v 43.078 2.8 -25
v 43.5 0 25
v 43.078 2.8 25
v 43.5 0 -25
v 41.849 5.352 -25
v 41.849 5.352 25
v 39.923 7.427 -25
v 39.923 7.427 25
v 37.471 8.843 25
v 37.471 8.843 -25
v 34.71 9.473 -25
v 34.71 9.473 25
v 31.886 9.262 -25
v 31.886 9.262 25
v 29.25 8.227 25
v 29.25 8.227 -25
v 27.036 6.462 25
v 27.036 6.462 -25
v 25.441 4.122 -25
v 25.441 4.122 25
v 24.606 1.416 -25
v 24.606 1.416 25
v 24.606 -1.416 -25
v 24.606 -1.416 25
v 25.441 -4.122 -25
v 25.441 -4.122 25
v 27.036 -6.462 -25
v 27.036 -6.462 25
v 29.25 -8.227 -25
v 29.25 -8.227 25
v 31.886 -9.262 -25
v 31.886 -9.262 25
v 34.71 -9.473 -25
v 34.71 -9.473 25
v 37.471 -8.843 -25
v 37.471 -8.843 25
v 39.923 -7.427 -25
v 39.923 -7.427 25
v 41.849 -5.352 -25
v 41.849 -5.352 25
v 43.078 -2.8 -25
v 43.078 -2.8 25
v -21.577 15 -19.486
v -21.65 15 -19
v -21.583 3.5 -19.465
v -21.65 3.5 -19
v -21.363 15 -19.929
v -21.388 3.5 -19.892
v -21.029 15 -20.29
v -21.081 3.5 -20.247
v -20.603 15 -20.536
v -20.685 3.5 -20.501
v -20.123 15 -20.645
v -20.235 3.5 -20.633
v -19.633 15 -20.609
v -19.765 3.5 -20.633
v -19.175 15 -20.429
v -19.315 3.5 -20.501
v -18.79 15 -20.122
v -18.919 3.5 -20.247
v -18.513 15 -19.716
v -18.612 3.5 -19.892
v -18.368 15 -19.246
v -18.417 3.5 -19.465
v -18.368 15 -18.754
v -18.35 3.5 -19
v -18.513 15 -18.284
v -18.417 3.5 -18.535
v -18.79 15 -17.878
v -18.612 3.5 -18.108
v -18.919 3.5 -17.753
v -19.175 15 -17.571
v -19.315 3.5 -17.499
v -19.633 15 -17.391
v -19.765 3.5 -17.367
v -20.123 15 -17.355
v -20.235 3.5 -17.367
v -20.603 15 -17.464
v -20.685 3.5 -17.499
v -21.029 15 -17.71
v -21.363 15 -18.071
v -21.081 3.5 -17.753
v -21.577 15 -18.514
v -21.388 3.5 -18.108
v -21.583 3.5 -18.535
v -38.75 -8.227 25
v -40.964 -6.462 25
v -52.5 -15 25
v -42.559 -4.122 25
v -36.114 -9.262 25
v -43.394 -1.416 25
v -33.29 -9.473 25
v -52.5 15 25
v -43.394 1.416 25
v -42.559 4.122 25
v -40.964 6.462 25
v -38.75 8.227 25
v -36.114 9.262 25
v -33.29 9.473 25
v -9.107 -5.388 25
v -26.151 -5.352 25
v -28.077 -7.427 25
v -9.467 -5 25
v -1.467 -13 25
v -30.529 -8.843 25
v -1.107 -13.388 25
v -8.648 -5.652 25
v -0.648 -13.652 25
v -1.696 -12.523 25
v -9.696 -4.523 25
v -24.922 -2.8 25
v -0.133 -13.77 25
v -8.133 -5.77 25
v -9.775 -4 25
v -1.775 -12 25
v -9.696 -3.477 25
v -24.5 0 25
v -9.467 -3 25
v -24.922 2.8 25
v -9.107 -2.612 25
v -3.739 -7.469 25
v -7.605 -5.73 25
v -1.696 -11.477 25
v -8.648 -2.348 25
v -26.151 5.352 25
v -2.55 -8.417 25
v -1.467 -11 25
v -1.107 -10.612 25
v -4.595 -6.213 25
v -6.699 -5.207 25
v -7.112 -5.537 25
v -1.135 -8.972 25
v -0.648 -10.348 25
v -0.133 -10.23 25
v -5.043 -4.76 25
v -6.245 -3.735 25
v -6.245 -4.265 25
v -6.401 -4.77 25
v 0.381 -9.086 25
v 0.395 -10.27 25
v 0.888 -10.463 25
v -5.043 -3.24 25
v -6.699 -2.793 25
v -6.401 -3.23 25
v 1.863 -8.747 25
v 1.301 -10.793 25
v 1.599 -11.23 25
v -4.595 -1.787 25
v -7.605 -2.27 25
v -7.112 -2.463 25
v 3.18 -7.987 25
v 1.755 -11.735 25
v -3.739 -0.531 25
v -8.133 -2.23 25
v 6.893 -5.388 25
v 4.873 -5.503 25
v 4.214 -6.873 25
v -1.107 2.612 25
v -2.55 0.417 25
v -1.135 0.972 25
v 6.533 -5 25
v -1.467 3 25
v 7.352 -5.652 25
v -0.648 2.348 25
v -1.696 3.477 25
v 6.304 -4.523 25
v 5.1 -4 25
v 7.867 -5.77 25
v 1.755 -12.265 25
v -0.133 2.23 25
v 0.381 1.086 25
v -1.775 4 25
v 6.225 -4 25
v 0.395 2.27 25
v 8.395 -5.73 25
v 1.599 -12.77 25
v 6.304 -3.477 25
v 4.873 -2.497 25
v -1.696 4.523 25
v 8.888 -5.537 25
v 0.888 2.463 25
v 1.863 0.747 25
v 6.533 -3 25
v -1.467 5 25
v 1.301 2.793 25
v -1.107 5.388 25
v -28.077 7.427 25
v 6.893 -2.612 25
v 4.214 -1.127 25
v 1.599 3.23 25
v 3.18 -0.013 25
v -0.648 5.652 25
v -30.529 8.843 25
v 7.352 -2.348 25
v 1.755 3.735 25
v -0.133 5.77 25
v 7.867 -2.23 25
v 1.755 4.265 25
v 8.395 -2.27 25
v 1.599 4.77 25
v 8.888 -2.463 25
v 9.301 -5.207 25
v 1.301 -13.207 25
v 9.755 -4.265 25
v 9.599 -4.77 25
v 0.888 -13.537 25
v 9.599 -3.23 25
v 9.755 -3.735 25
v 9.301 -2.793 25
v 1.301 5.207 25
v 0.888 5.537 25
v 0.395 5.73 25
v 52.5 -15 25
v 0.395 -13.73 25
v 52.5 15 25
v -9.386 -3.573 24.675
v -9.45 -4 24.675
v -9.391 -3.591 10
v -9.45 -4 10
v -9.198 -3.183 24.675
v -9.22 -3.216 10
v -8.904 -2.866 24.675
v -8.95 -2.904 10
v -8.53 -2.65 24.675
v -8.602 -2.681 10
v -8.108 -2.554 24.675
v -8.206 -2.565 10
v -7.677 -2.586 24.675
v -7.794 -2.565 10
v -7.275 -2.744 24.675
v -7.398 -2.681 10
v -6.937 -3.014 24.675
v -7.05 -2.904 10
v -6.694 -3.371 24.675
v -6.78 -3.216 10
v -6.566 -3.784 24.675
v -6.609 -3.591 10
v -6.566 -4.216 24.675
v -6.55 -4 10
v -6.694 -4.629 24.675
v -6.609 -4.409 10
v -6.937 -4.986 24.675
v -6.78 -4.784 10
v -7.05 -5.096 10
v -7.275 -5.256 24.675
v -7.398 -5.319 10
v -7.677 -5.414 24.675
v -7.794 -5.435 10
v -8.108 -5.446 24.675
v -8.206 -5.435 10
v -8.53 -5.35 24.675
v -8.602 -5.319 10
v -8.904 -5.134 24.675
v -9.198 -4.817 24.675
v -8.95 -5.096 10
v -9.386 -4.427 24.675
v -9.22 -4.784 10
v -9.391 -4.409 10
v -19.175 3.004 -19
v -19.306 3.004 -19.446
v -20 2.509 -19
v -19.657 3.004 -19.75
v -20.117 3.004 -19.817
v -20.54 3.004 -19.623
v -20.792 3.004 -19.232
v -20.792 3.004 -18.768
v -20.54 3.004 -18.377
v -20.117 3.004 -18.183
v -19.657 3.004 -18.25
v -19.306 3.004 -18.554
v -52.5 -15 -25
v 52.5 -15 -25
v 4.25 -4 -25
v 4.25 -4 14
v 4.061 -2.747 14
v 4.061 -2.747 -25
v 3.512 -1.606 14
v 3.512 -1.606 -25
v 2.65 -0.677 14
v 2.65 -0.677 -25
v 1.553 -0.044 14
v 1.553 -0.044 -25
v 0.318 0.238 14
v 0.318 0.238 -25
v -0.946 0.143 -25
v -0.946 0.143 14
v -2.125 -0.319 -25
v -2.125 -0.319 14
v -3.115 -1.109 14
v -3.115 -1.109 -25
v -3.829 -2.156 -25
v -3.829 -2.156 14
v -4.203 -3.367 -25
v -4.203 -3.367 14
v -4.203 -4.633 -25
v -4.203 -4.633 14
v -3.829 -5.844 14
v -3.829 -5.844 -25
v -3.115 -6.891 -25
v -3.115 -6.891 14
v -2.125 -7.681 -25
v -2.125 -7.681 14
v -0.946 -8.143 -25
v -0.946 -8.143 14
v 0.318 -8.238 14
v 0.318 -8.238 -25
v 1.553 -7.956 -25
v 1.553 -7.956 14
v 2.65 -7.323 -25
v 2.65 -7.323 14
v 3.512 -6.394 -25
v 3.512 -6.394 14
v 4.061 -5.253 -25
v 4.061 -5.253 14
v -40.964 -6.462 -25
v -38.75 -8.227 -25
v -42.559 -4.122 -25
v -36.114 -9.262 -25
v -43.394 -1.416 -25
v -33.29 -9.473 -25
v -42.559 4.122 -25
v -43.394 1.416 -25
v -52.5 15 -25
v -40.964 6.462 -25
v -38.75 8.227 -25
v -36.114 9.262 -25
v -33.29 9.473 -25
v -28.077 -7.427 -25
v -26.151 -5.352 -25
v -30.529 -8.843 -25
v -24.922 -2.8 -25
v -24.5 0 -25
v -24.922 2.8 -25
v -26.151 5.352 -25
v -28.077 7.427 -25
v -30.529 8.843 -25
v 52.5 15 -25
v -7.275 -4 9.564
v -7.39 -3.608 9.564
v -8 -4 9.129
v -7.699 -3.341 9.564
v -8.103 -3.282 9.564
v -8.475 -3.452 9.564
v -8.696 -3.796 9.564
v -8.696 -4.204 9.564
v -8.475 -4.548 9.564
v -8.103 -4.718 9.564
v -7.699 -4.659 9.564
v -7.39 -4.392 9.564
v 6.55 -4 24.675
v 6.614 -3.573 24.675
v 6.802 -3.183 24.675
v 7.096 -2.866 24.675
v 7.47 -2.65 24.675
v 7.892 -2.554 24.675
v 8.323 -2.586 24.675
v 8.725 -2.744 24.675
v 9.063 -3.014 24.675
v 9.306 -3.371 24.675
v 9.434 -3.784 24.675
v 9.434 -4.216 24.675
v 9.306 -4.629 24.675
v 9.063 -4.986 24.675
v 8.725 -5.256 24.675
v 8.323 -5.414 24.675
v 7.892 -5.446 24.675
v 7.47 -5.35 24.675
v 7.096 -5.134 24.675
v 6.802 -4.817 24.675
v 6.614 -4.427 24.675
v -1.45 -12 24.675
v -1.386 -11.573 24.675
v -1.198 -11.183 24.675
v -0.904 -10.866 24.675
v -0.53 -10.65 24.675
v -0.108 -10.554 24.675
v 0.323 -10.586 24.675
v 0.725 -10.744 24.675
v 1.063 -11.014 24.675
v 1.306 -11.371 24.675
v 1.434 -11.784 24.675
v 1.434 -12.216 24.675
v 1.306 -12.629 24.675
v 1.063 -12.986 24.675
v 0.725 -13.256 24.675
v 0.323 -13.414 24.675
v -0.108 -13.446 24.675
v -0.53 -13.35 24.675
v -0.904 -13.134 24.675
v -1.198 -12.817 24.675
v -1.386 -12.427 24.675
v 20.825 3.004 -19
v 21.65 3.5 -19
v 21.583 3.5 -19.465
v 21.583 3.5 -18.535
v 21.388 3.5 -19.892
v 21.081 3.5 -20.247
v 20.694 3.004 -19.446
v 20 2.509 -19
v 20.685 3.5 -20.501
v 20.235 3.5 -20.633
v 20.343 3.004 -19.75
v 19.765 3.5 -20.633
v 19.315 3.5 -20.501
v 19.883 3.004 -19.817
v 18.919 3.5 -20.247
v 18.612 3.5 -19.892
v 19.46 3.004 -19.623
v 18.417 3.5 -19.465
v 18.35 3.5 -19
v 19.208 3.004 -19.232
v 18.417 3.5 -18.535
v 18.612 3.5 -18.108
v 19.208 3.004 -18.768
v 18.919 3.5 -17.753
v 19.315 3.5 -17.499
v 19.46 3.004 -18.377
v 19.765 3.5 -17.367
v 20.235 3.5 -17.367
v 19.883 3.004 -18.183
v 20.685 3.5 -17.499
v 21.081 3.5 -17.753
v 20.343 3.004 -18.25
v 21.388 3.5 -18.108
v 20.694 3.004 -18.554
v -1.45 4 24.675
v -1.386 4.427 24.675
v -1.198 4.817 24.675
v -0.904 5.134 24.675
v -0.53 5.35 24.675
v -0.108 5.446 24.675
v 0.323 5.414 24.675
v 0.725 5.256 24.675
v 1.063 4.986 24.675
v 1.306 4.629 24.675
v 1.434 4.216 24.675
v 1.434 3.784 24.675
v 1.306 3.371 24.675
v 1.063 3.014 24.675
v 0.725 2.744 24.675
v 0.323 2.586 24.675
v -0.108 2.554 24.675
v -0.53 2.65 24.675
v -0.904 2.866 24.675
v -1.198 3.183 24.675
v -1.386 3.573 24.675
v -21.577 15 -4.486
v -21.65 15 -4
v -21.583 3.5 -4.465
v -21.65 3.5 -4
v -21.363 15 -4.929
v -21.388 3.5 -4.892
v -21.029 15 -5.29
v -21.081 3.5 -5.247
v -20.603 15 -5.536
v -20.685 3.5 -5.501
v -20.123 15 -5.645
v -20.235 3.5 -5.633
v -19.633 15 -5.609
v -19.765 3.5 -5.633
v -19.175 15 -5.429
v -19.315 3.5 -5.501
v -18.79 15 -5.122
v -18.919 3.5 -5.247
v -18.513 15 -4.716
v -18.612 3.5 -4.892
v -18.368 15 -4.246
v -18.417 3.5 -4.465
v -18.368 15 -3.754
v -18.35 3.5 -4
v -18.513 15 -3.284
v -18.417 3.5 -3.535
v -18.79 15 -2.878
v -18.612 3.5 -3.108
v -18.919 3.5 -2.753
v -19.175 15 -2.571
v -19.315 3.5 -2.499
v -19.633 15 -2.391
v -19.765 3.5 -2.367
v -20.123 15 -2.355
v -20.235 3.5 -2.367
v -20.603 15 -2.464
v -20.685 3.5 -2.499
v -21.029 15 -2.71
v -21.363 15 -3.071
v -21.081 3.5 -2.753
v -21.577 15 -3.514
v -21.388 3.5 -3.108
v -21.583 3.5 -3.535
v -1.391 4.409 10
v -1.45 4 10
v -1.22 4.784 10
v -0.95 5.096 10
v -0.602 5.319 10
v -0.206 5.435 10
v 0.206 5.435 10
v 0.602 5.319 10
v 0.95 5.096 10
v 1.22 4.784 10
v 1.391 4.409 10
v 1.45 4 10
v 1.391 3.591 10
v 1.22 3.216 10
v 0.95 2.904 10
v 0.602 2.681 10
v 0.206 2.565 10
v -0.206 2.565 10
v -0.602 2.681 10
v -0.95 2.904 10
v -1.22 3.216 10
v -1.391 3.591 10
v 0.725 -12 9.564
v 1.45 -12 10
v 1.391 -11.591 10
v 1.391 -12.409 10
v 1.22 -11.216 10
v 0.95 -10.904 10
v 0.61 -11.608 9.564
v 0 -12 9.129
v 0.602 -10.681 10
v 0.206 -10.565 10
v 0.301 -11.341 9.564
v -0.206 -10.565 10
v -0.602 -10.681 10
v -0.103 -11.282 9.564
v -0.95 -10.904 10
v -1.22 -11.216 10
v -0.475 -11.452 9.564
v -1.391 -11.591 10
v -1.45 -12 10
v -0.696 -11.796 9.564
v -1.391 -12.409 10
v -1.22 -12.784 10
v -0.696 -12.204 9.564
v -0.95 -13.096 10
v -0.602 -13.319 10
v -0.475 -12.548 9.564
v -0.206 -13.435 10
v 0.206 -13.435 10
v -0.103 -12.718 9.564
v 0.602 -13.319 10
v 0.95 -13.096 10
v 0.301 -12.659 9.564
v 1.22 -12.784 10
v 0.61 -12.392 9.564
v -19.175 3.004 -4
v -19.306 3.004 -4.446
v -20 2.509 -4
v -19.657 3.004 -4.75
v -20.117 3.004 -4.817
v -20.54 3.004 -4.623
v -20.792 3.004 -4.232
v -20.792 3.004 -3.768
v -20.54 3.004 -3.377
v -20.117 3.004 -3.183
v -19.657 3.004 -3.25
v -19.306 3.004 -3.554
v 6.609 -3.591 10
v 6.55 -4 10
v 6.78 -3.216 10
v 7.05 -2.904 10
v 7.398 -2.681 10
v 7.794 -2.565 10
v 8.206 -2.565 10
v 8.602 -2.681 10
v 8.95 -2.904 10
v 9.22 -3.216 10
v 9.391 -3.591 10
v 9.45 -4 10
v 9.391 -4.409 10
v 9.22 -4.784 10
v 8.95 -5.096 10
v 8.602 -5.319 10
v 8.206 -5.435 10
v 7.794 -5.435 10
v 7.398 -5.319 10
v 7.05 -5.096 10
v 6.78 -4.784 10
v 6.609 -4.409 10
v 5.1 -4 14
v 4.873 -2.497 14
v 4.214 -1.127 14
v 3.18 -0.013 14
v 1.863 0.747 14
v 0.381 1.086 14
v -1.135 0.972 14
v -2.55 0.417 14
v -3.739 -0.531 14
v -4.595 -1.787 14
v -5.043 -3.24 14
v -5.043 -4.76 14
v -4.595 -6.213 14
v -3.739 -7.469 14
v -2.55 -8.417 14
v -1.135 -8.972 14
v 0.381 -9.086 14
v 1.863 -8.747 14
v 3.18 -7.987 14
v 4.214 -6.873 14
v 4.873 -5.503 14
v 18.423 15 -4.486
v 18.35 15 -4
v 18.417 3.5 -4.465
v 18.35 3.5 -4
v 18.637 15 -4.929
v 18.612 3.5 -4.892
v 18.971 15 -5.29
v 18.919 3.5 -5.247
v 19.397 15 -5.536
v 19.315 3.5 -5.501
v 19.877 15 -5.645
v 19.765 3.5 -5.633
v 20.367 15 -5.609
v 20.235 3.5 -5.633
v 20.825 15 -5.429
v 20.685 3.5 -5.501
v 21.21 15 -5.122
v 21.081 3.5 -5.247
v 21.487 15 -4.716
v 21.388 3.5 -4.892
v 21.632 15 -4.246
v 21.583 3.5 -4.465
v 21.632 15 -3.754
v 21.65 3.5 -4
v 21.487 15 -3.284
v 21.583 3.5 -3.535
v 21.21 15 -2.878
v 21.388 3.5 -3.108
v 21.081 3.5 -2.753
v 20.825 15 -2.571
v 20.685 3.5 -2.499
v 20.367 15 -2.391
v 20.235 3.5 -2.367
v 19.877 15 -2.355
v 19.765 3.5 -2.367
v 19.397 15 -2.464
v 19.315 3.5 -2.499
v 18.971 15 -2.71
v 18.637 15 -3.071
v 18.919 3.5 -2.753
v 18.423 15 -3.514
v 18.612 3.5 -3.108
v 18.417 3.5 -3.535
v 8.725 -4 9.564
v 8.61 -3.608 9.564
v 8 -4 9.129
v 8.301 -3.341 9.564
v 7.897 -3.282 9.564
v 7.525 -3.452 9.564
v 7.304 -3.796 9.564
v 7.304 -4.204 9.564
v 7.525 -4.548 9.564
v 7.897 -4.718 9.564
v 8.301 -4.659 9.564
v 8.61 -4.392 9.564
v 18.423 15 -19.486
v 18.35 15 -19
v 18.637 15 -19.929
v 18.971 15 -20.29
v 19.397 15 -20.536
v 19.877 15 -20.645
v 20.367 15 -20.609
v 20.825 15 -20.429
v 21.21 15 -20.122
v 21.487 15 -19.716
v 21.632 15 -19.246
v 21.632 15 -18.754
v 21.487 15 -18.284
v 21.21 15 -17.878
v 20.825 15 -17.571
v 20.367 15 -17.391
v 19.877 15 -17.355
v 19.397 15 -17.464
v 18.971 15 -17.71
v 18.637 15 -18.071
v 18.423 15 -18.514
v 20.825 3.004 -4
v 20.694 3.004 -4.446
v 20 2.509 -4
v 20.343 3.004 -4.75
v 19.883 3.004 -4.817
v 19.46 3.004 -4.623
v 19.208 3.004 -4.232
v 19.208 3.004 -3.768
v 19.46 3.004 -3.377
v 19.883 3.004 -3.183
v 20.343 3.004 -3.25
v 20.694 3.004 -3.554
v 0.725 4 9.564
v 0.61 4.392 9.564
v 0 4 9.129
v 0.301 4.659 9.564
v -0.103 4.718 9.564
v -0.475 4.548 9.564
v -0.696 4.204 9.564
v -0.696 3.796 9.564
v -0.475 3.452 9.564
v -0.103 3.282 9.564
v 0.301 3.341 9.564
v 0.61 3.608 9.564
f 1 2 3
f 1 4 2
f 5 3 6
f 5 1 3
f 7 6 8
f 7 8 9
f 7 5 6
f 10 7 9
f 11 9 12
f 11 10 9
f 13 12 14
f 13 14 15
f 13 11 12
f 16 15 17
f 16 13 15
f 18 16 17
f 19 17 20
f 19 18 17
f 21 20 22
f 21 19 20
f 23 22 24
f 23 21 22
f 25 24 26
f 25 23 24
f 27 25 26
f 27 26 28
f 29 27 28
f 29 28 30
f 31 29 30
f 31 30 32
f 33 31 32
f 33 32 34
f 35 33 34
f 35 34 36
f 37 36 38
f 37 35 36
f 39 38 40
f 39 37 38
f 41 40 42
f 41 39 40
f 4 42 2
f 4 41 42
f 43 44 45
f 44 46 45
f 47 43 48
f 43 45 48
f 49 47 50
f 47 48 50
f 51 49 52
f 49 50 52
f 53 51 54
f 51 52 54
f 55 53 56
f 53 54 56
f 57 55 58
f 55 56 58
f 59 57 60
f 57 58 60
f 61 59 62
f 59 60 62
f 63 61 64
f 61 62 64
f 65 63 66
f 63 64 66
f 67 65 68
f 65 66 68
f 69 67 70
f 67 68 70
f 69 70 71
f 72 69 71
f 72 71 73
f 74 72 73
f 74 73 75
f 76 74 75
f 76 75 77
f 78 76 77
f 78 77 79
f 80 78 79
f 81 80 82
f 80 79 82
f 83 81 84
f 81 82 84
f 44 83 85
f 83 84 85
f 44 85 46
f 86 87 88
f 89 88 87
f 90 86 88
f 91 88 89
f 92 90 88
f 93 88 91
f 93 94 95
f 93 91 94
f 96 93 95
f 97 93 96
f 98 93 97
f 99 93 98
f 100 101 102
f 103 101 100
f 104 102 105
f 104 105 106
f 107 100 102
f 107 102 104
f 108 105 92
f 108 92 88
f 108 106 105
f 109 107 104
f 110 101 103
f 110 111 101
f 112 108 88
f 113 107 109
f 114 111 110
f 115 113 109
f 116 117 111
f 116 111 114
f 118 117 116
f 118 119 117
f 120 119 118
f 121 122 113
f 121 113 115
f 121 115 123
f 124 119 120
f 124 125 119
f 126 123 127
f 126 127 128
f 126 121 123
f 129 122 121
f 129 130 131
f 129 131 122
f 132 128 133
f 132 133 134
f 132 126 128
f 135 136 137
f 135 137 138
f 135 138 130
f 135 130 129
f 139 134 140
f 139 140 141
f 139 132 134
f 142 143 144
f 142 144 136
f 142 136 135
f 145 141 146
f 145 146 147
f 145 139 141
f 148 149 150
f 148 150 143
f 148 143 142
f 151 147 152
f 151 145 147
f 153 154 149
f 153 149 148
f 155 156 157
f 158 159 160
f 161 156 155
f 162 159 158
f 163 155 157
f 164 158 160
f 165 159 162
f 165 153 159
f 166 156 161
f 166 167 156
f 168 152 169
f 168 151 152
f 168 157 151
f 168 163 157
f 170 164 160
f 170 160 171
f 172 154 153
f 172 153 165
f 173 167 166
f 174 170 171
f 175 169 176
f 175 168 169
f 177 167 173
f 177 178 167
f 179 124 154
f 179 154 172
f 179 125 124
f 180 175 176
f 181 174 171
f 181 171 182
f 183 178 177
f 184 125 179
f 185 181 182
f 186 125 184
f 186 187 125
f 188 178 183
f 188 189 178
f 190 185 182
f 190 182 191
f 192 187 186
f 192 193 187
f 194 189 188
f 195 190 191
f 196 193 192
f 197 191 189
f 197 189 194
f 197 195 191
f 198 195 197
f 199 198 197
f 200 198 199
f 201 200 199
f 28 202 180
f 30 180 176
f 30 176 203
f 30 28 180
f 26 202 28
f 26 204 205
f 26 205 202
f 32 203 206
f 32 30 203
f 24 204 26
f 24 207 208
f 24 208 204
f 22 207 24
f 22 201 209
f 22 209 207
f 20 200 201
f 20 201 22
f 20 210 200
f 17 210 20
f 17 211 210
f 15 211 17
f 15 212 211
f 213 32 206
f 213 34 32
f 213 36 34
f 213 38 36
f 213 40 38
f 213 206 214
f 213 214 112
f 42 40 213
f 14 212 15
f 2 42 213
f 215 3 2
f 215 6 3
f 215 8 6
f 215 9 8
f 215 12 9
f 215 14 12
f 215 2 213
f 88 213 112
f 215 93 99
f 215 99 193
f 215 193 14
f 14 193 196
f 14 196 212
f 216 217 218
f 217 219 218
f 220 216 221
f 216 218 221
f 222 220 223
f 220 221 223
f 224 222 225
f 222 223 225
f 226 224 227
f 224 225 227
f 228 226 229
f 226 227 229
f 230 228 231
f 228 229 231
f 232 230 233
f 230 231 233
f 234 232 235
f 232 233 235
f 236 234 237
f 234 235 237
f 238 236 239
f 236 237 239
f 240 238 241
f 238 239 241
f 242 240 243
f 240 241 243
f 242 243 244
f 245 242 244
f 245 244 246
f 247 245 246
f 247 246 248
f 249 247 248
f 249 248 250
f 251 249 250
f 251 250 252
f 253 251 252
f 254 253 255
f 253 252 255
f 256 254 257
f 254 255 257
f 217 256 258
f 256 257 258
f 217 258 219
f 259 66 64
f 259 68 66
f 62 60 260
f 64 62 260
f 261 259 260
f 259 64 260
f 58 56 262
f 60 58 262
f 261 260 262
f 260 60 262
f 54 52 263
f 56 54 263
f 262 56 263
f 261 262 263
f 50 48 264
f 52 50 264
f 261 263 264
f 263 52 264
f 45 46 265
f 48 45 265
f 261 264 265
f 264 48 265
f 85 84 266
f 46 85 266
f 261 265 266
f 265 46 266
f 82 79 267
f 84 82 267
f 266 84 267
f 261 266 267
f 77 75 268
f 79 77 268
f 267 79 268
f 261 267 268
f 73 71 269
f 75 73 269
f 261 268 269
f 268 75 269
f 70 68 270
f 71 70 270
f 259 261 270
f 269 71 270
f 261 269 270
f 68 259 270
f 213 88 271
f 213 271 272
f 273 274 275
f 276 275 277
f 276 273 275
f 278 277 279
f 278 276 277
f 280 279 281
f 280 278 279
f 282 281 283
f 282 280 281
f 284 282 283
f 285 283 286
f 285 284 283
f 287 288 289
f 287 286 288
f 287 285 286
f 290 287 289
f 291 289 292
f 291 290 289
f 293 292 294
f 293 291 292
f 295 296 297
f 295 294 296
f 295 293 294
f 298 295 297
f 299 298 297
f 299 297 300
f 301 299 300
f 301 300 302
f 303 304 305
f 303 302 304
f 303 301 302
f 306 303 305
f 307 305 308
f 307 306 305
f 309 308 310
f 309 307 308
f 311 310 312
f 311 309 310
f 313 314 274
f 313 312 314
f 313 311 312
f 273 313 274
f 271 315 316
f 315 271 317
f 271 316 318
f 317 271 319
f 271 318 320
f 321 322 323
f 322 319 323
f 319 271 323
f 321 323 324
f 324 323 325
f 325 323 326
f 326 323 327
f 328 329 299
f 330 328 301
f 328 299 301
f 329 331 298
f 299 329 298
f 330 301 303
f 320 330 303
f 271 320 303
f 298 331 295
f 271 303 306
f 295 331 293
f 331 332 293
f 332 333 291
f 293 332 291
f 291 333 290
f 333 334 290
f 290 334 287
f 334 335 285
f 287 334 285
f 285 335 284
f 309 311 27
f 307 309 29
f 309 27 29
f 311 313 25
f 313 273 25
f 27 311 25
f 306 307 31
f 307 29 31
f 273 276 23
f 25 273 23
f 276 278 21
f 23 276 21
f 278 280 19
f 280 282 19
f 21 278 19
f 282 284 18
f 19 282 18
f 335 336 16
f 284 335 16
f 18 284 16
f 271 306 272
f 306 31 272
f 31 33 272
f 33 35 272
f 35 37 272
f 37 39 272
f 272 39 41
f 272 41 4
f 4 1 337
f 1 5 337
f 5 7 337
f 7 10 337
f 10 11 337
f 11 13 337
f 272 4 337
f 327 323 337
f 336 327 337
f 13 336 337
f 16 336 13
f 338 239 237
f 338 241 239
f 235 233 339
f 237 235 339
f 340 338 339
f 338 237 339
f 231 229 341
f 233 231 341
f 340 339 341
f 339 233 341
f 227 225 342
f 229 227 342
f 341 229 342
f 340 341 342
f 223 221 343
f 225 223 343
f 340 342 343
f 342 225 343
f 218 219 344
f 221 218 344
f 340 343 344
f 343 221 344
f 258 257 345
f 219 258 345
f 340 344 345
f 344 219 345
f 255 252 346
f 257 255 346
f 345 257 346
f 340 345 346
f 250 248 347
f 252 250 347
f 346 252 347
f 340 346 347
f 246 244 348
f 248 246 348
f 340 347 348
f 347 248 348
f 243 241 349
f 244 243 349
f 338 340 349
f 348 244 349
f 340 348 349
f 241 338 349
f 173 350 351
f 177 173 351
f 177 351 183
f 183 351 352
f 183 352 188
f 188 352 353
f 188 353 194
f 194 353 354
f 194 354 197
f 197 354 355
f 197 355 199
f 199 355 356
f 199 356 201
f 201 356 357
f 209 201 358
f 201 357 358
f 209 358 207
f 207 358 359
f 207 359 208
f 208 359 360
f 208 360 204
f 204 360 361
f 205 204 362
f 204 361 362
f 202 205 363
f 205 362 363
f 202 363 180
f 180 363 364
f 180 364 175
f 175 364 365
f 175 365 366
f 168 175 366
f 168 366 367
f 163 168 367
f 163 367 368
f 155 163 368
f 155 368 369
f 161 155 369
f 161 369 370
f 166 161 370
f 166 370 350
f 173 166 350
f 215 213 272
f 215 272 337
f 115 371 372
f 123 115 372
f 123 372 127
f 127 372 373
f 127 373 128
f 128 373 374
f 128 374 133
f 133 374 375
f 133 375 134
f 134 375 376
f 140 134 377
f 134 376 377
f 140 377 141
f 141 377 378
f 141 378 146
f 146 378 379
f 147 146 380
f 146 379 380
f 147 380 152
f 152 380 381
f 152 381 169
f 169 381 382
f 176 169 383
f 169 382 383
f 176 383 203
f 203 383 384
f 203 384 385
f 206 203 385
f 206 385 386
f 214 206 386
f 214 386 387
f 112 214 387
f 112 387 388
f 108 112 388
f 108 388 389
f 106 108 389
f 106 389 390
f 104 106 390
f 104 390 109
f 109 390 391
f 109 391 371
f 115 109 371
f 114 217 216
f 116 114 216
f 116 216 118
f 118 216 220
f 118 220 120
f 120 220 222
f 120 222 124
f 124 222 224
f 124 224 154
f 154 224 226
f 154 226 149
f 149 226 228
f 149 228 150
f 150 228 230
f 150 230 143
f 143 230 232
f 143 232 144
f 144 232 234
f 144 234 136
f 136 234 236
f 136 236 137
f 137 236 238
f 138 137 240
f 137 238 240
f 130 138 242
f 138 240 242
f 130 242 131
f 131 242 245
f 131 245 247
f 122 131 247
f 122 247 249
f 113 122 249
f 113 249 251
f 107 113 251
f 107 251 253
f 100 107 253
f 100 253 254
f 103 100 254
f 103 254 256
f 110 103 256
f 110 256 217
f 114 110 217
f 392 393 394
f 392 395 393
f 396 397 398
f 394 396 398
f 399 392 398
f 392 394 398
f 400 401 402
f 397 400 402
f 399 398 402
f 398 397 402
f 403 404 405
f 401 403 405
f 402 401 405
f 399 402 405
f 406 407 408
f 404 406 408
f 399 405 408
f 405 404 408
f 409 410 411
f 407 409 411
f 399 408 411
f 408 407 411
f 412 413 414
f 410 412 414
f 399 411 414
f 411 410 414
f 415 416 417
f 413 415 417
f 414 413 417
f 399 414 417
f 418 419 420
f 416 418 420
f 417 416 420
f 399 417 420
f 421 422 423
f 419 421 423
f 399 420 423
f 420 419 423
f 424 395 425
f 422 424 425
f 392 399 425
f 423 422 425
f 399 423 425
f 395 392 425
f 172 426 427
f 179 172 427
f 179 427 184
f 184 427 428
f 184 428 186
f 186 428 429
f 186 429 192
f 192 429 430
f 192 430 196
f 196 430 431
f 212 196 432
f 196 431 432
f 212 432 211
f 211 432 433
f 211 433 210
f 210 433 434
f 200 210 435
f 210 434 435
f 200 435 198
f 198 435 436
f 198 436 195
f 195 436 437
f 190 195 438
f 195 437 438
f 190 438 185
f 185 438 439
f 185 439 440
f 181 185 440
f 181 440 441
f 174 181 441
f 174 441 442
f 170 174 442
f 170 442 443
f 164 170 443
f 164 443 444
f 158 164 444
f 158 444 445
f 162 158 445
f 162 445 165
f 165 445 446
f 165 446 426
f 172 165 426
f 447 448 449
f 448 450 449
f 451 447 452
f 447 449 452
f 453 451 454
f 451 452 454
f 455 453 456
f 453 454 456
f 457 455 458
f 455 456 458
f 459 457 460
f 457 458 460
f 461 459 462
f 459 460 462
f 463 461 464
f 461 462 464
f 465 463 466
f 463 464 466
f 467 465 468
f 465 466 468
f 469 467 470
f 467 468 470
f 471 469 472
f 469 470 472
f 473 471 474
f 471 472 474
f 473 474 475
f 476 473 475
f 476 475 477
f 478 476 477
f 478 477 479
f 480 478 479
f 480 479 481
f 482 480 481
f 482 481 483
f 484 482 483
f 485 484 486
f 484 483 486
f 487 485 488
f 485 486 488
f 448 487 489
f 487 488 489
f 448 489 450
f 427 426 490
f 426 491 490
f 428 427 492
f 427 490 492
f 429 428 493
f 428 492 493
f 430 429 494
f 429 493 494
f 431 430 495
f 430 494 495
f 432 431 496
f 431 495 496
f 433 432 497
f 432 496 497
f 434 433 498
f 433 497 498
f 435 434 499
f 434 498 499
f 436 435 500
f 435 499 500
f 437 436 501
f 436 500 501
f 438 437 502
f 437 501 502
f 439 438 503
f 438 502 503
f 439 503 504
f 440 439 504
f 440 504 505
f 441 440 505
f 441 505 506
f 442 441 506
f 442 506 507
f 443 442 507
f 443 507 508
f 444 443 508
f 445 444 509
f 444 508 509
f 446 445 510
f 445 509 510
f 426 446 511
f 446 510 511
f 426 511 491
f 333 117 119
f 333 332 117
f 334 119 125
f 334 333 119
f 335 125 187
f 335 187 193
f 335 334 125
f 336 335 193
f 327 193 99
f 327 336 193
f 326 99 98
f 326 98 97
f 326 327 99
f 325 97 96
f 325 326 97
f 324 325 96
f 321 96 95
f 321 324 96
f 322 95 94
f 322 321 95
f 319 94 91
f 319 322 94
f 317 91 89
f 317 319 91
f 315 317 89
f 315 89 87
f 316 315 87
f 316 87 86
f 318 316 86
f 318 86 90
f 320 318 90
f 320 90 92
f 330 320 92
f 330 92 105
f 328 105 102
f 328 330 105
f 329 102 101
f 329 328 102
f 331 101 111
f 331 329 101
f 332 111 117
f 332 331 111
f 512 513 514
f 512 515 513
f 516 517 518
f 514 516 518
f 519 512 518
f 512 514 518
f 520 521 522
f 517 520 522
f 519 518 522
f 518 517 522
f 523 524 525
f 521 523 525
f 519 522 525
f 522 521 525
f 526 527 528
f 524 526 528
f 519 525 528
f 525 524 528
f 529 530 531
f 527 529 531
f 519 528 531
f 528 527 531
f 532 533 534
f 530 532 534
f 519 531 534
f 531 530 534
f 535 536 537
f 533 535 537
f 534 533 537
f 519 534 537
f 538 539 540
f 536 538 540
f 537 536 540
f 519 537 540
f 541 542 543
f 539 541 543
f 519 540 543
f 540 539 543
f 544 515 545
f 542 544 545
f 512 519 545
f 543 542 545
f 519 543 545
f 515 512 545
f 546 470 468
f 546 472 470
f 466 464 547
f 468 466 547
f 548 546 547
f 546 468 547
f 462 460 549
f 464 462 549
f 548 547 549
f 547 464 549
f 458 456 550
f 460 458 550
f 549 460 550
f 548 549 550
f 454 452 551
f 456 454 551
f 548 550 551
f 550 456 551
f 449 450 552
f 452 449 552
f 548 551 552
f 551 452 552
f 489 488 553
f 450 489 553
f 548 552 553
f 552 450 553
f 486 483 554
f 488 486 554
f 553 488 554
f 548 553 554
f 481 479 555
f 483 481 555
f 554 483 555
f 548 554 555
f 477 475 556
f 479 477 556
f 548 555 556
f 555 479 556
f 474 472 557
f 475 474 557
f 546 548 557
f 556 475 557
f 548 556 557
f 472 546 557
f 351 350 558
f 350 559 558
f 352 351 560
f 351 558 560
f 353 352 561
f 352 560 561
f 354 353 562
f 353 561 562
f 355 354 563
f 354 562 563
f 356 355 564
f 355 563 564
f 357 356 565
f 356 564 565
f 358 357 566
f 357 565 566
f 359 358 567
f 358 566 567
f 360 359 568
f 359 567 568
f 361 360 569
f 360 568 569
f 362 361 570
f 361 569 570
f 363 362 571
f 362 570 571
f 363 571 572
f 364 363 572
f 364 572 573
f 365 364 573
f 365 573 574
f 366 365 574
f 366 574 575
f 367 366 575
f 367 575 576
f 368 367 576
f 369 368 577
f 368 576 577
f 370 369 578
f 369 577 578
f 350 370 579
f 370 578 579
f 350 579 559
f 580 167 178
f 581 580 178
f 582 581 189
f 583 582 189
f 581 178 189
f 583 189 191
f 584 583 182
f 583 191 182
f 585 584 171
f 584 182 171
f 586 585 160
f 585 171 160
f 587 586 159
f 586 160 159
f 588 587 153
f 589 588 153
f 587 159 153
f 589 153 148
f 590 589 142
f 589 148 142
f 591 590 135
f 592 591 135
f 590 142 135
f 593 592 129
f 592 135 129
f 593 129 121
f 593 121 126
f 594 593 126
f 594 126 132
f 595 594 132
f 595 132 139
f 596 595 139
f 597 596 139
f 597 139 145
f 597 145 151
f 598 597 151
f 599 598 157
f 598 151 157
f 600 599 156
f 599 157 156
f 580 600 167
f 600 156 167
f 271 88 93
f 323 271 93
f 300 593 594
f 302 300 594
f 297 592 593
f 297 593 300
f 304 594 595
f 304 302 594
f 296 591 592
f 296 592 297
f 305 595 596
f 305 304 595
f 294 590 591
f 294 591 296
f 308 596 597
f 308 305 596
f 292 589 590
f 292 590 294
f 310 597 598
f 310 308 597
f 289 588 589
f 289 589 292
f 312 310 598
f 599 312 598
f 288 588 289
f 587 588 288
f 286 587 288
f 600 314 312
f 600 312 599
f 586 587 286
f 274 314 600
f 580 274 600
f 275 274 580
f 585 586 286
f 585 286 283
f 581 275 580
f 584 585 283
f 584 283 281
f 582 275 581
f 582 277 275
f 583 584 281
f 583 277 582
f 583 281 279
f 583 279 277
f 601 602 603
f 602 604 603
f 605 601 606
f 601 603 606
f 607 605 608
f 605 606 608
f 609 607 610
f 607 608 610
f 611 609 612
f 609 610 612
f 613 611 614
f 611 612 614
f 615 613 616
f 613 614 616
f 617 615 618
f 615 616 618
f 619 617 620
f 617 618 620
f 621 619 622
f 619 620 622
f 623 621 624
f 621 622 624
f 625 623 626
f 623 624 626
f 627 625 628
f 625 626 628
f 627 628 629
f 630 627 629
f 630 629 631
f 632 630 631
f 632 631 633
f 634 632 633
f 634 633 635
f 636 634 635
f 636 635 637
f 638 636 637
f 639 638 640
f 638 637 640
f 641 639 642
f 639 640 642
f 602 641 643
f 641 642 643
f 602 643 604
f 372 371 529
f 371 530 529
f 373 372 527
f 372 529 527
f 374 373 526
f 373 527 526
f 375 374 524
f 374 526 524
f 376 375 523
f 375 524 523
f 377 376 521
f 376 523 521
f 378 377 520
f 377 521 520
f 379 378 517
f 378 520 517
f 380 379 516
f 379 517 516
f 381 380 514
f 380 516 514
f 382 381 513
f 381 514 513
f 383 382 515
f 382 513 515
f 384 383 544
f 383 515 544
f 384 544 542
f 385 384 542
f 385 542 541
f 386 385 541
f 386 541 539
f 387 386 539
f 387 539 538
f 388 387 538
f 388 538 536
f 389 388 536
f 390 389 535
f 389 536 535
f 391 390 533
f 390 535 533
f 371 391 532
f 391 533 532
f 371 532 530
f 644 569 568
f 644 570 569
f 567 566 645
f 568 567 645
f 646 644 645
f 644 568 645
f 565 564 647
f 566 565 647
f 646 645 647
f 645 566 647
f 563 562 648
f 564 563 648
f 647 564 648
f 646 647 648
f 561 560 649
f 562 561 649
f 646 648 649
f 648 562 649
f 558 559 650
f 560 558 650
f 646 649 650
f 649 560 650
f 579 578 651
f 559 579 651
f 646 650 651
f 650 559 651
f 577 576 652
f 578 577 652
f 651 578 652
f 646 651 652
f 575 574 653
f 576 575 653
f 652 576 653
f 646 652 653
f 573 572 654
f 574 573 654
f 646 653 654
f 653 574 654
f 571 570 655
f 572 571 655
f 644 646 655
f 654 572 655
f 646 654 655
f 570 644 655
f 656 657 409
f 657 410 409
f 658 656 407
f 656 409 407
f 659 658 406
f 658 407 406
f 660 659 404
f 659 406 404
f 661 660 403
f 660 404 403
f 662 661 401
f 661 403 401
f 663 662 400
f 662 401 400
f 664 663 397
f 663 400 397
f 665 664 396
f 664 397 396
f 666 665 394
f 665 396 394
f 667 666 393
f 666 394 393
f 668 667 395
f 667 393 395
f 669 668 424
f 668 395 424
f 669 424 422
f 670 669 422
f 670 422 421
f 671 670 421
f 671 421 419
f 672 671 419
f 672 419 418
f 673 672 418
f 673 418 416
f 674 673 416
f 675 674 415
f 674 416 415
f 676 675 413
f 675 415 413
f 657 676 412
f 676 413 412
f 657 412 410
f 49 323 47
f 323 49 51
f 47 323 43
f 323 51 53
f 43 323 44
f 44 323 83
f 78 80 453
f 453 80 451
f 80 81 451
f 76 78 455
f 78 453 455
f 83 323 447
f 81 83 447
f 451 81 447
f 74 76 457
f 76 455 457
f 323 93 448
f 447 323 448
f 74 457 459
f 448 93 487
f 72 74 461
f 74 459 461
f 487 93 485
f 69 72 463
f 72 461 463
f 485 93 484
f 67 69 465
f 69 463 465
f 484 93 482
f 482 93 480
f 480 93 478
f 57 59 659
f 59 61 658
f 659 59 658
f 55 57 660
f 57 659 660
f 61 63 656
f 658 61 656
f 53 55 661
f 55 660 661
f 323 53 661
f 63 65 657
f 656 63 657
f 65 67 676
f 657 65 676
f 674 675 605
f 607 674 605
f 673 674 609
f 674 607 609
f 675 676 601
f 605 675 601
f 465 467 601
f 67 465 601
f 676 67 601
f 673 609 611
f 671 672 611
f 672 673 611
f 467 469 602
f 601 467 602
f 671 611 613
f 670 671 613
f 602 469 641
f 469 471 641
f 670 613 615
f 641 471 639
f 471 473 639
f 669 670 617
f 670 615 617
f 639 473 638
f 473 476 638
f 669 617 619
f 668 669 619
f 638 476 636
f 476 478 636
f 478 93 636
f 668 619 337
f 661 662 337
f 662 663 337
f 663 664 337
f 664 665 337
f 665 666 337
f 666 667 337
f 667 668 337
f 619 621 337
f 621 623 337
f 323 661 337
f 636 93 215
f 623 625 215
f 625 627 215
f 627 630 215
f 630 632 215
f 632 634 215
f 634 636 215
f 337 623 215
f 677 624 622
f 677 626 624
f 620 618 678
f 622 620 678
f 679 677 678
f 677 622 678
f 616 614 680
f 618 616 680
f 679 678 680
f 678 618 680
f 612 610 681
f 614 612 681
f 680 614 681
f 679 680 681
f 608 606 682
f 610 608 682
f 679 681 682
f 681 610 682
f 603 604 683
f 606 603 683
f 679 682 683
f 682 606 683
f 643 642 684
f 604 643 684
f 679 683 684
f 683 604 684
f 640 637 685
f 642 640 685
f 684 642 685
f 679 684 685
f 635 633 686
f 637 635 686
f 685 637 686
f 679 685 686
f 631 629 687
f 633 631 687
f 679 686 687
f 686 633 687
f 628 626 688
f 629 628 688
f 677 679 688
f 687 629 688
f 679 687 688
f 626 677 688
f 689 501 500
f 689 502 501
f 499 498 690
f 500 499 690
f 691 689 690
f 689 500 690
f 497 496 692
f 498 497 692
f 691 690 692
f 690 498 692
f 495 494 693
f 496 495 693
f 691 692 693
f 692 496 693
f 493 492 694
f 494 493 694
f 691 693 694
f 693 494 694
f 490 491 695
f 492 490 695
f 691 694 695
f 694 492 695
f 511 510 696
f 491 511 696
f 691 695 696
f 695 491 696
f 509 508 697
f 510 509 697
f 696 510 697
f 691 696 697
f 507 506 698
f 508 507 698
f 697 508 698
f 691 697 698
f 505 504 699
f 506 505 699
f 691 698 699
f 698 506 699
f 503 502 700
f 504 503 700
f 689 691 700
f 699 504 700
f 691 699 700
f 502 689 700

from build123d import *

# Parameters (mm, degrees)
ESBO_O1_W                             = 105
ESBO_O1_H                             = 30
ESBO_O1_R                             = 9.5
ESBO_O1_R_2                           = 4.25
RESSALTO_EXTRUS_O1_DEPTH              = 25
M4X0_7_TAPPED_HOLE1_D                 = 3.3
M4X0_7_TAPPED_HOLE1_DEPTH             = 11.5
M4X0_7_TAPPED_HOLE1_TIP               = 0.991420021
ESBO_O4_R                             = 5.1
CORTE_EXTRUS_O1_DEPTH                 = 11
FURO_ROSCADO_DE_M3_5X0_62_D           = 2.9
FURO_ROSCADO_DE_M3_5X0_62_DEPTH       = 15
FURO_ROSCADO_DE_M3_5X0_62_CSINK_D     = 3.55
FURO_ROSCADO_DE_M3_5X0_62_CSINK_ANGLE = 90
FURO_ROSCADO_DE_M3_5X0_62_TIP         = 0.871247898


with BuildPart() as part:
    # Esboço1 → Ressalto-extrusão1 (new, symmetric)
    with BuildSketch(Plane.XY):
        Rectangle(ESBO_O1_W, ESBO_O1_H)
        with Locations((-34, 0)):
            Circle(ESBO_O1_R, mode=Mode.SUBTRACT)
        with Locations((34, 0)):
            Circle(ESBO_O1_R, mode=Mode.SUBTRACT)
        with Locations((0, -4)):
            Circle(ESBO_O1_R_2, mode=Mode.SUBTRACT)
    extrude(amount=RESSALTO_EXTRUS_O1_DEPTH, both=True)

    # M4x0.7 Tapped Hole1
    with Locations(Plane(origin=(0, 15, 0), x_dir=(1, 0, 0), z_dir=(0, 1, 0))):
        with Locations((20, 19), (20, 4), (-20, 4), (-20, 19)):
            Hole(M4X0_7_TAPPED_HOLE1_D / 2, depth=M4X0_7_TAPPED_HOLE1_DEPTH)
            with Locations((0, 0, -(M4X0_7_TAPPED_HOLE1_DEPTH + M4X0_7_TAPPED_HOLE1_TIP / 2))):  # 118° drill point
                Cone(0, M4X0_7_TAPPED_HOLE1_D / 2, M4X0_7_TAPPED_HOLE1_TIP, mode=Mode.SUBTRACT)

    # Esboço4 → Corte-extrusão1 (cut)
    with BuildSketch(Plane.XY.offset(25)):
        with Locations((0, -4)):
            Circle(ESBO_O4_R)
    extrude(amount=-CORTE_EXTRUS_O1_DEPTH, mode=Mode.SUBTRACT)

    # Furo roscado de M3.5x0.62
    with Locations(Plane.XY.offset(25)):
        with Locations((-8, -4), (0, 4), (8, -4), (0, -12)):
            CounterSinkHole(FURO_ROSCADO_DE_M3_5X0_62_D / 2, FURO_ROSCADO_DE_M3_5X0_62_CSINK_D / 2, depth=FURO_ROSCADO_DE_M3_5X0_62_DEPTH, counter_sink_angle=FURO_ROSCADO_DE_M3_5X0_62_CSINK_ANGLE)
            with Locations((0, 0, -(FURO_ROSCADO_DE_M3_5X0_62_DEPTH + FURO_ROSCADO_DE_M3_5X0_62_TIP / 2))):  # 118° drill point
                Cone(0, FURO_ROSCADO_DE_M3_5X0_62_D / 2, FURO_ROSCADO_DE_M3_5X0_62_TIP, mode=Mode.SUBTRACT)


solid = part.part
